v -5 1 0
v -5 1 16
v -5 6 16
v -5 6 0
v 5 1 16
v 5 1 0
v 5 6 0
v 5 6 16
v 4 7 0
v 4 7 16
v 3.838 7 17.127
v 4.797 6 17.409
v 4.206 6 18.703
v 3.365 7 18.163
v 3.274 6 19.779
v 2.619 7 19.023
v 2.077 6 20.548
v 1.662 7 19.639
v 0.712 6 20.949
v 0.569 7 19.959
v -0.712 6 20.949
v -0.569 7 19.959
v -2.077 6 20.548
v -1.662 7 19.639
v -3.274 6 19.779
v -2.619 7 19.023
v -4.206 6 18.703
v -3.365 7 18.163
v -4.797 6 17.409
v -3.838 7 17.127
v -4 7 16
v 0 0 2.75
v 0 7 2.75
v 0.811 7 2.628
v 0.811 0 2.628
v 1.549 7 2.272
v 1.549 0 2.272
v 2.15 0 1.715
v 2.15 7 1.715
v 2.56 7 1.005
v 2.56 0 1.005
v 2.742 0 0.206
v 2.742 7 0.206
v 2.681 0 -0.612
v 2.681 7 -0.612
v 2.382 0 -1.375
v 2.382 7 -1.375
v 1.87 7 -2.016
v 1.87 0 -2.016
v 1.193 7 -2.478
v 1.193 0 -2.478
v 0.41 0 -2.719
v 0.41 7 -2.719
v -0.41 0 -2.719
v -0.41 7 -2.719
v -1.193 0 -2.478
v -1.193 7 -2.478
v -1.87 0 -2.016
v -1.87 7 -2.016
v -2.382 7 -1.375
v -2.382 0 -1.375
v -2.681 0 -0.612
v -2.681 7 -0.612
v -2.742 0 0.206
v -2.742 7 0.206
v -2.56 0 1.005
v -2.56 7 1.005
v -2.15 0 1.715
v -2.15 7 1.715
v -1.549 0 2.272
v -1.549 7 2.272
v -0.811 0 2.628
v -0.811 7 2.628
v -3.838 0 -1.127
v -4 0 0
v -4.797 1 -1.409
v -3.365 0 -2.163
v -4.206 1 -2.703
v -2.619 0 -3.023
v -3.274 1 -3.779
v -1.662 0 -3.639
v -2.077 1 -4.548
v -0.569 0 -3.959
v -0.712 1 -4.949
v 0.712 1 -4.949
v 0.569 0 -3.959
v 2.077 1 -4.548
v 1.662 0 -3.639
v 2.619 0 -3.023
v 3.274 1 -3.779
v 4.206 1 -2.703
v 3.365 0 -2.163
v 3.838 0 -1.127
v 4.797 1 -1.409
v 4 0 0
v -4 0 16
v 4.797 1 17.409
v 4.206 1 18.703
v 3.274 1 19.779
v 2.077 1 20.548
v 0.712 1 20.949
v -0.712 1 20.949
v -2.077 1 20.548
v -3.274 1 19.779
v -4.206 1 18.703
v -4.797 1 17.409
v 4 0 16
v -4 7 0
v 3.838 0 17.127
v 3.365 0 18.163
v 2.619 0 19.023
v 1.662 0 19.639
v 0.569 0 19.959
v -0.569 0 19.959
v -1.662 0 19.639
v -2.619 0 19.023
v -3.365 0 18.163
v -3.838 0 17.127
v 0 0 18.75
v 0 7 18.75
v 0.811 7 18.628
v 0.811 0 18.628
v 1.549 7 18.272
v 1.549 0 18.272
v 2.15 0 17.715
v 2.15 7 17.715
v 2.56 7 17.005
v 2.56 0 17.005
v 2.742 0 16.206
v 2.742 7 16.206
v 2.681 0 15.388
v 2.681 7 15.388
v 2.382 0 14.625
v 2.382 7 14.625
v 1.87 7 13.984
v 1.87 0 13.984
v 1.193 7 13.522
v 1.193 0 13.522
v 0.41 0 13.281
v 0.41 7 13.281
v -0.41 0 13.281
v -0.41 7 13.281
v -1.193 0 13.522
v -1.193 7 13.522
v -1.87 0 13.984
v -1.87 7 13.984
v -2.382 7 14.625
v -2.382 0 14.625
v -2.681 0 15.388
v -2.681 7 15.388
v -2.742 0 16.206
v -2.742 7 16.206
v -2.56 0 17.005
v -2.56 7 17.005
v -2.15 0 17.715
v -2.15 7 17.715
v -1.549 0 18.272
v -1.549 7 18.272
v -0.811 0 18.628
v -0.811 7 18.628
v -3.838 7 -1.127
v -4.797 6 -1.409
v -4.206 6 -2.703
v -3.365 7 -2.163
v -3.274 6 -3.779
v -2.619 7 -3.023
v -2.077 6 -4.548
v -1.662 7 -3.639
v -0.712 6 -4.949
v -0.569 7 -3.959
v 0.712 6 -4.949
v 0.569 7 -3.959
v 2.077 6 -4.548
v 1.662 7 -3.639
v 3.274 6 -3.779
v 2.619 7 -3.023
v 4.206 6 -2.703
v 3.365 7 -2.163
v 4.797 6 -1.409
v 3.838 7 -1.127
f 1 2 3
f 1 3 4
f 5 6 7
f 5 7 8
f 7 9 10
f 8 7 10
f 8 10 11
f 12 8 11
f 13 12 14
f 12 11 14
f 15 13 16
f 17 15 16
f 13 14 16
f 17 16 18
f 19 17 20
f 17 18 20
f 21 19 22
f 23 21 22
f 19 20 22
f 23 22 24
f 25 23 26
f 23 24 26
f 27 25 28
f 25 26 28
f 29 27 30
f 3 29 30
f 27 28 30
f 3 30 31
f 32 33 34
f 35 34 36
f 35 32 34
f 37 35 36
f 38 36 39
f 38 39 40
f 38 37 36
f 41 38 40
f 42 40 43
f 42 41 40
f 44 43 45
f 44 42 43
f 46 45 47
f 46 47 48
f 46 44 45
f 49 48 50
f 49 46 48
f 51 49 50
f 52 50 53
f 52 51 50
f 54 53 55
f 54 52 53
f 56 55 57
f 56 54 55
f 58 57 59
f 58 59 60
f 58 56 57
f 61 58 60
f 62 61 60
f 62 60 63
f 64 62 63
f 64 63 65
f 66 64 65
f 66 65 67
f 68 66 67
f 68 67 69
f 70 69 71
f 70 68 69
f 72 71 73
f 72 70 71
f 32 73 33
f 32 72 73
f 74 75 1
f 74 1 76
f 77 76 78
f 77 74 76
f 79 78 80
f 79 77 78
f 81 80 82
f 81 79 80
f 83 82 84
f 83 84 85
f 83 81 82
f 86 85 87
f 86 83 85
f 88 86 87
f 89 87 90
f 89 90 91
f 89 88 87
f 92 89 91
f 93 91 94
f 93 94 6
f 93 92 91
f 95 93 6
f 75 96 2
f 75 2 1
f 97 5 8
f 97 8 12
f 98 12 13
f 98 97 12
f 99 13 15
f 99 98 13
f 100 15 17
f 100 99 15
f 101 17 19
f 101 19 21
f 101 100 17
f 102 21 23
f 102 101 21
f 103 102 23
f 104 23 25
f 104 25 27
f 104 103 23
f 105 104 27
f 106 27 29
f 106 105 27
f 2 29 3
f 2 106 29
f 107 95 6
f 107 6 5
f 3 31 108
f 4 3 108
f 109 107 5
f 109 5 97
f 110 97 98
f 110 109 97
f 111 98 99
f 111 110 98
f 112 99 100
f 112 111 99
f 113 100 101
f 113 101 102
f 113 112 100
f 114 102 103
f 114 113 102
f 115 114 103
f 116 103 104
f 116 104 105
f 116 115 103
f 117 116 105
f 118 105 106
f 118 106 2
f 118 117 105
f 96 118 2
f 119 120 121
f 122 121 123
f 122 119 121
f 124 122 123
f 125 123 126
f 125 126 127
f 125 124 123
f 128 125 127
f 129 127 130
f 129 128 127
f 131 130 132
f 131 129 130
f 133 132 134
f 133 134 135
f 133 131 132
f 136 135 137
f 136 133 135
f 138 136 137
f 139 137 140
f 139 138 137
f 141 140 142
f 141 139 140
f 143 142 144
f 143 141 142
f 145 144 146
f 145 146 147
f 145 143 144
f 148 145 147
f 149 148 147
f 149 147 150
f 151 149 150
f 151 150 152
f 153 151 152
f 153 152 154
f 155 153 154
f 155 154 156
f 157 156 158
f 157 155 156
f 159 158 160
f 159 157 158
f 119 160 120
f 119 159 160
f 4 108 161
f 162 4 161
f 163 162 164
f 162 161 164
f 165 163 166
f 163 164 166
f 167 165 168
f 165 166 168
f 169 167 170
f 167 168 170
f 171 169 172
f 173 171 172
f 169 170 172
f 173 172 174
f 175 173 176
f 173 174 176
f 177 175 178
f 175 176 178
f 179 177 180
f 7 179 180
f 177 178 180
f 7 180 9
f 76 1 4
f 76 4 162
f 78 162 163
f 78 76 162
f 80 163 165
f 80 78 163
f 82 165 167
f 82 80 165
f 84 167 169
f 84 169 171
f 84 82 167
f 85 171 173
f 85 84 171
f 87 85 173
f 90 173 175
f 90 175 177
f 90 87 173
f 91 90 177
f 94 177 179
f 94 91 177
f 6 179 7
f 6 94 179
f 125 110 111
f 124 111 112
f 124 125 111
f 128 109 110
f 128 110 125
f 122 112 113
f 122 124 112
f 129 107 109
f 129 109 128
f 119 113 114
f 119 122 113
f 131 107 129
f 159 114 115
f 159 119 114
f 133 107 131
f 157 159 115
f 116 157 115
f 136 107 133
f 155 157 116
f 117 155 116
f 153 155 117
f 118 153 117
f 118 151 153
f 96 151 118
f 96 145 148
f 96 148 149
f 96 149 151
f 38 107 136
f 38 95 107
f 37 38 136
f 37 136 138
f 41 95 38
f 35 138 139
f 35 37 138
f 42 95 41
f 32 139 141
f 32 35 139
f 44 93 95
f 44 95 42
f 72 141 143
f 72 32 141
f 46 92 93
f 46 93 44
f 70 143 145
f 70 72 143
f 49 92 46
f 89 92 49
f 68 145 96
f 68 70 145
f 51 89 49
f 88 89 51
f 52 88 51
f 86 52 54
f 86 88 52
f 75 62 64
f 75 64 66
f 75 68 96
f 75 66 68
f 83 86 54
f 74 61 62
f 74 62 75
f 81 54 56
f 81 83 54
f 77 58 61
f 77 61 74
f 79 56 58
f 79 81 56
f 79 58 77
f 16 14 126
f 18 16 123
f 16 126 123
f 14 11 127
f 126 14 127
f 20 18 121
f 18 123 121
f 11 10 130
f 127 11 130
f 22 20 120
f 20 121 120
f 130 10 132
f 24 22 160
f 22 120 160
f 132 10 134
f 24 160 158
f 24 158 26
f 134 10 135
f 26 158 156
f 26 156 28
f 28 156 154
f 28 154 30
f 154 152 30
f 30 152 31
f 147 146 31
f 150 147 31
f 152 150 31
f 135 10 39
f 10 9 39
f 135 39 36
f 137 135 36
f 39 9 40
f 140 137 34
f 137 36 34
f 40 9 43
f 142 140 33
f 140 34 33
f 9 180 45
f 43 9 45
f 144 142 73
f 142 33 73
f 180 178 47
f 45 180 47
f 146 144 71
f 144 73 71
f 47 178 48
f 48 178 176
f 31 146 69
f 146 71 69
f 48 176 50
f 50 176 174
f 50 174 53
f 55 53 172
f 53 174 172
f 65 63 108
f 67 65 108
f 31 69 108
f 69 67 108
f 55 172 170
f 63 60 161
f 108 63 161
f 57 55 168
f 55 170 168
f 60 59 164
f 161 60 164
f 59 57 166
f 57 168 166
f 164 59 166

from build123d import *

# Parameters (mm, degrees)
SKETCH_1_R      = 2.75
EXTRUDE_1_DEPTH = 7
CHAMFER_1_SIZE  = 1


with BuildPart() as part:
    # 草图1 → 凸台-拉伸1 (new body)
    with BuildSketch(Plane(origin=(0, 0, 0), x_dir=(1, 0, 0), z_dir=(0, 1, 0))):
        with BuildLine():
            Line((-5, -16), (-5, 0))
            ThreePointArc((-5, 0), (0, 5), (5, 0))
            Line((5, 0), (5, -16))
            ThreePointArc((5, -16), (0, -21), (-5, -16))
        make_face()
        with Locations(Location((0, 0, 0), (0, 0, 270))):
            Circle(SKETCH_1_R, mode=Mode.SUBTRACT)
        with Locations(Location((0, -16, 0), (0, 0, 270))):
            Circle(SKETCH_1_R, mode=Mode.SUBTRACT)
    extrude(amount=EXTRUDE_1_DEPTH)

    # 倒角1
    chamfer_1_edges = [part.edges().sort_by_distance(p)[0] for p in [
        (0, 7, -5),
        (-5, 7, 8),
        (0, 7, 21),
        (-5, 0, 8),
        (0, 0, -5),
        (5, 0, 8),
        (0, 0, 21),
        (5, 7, 8),
    ]]
    chamfer(chamfer_1_edges, length=CHAMFER_1_SIZE)


solid = part.part
